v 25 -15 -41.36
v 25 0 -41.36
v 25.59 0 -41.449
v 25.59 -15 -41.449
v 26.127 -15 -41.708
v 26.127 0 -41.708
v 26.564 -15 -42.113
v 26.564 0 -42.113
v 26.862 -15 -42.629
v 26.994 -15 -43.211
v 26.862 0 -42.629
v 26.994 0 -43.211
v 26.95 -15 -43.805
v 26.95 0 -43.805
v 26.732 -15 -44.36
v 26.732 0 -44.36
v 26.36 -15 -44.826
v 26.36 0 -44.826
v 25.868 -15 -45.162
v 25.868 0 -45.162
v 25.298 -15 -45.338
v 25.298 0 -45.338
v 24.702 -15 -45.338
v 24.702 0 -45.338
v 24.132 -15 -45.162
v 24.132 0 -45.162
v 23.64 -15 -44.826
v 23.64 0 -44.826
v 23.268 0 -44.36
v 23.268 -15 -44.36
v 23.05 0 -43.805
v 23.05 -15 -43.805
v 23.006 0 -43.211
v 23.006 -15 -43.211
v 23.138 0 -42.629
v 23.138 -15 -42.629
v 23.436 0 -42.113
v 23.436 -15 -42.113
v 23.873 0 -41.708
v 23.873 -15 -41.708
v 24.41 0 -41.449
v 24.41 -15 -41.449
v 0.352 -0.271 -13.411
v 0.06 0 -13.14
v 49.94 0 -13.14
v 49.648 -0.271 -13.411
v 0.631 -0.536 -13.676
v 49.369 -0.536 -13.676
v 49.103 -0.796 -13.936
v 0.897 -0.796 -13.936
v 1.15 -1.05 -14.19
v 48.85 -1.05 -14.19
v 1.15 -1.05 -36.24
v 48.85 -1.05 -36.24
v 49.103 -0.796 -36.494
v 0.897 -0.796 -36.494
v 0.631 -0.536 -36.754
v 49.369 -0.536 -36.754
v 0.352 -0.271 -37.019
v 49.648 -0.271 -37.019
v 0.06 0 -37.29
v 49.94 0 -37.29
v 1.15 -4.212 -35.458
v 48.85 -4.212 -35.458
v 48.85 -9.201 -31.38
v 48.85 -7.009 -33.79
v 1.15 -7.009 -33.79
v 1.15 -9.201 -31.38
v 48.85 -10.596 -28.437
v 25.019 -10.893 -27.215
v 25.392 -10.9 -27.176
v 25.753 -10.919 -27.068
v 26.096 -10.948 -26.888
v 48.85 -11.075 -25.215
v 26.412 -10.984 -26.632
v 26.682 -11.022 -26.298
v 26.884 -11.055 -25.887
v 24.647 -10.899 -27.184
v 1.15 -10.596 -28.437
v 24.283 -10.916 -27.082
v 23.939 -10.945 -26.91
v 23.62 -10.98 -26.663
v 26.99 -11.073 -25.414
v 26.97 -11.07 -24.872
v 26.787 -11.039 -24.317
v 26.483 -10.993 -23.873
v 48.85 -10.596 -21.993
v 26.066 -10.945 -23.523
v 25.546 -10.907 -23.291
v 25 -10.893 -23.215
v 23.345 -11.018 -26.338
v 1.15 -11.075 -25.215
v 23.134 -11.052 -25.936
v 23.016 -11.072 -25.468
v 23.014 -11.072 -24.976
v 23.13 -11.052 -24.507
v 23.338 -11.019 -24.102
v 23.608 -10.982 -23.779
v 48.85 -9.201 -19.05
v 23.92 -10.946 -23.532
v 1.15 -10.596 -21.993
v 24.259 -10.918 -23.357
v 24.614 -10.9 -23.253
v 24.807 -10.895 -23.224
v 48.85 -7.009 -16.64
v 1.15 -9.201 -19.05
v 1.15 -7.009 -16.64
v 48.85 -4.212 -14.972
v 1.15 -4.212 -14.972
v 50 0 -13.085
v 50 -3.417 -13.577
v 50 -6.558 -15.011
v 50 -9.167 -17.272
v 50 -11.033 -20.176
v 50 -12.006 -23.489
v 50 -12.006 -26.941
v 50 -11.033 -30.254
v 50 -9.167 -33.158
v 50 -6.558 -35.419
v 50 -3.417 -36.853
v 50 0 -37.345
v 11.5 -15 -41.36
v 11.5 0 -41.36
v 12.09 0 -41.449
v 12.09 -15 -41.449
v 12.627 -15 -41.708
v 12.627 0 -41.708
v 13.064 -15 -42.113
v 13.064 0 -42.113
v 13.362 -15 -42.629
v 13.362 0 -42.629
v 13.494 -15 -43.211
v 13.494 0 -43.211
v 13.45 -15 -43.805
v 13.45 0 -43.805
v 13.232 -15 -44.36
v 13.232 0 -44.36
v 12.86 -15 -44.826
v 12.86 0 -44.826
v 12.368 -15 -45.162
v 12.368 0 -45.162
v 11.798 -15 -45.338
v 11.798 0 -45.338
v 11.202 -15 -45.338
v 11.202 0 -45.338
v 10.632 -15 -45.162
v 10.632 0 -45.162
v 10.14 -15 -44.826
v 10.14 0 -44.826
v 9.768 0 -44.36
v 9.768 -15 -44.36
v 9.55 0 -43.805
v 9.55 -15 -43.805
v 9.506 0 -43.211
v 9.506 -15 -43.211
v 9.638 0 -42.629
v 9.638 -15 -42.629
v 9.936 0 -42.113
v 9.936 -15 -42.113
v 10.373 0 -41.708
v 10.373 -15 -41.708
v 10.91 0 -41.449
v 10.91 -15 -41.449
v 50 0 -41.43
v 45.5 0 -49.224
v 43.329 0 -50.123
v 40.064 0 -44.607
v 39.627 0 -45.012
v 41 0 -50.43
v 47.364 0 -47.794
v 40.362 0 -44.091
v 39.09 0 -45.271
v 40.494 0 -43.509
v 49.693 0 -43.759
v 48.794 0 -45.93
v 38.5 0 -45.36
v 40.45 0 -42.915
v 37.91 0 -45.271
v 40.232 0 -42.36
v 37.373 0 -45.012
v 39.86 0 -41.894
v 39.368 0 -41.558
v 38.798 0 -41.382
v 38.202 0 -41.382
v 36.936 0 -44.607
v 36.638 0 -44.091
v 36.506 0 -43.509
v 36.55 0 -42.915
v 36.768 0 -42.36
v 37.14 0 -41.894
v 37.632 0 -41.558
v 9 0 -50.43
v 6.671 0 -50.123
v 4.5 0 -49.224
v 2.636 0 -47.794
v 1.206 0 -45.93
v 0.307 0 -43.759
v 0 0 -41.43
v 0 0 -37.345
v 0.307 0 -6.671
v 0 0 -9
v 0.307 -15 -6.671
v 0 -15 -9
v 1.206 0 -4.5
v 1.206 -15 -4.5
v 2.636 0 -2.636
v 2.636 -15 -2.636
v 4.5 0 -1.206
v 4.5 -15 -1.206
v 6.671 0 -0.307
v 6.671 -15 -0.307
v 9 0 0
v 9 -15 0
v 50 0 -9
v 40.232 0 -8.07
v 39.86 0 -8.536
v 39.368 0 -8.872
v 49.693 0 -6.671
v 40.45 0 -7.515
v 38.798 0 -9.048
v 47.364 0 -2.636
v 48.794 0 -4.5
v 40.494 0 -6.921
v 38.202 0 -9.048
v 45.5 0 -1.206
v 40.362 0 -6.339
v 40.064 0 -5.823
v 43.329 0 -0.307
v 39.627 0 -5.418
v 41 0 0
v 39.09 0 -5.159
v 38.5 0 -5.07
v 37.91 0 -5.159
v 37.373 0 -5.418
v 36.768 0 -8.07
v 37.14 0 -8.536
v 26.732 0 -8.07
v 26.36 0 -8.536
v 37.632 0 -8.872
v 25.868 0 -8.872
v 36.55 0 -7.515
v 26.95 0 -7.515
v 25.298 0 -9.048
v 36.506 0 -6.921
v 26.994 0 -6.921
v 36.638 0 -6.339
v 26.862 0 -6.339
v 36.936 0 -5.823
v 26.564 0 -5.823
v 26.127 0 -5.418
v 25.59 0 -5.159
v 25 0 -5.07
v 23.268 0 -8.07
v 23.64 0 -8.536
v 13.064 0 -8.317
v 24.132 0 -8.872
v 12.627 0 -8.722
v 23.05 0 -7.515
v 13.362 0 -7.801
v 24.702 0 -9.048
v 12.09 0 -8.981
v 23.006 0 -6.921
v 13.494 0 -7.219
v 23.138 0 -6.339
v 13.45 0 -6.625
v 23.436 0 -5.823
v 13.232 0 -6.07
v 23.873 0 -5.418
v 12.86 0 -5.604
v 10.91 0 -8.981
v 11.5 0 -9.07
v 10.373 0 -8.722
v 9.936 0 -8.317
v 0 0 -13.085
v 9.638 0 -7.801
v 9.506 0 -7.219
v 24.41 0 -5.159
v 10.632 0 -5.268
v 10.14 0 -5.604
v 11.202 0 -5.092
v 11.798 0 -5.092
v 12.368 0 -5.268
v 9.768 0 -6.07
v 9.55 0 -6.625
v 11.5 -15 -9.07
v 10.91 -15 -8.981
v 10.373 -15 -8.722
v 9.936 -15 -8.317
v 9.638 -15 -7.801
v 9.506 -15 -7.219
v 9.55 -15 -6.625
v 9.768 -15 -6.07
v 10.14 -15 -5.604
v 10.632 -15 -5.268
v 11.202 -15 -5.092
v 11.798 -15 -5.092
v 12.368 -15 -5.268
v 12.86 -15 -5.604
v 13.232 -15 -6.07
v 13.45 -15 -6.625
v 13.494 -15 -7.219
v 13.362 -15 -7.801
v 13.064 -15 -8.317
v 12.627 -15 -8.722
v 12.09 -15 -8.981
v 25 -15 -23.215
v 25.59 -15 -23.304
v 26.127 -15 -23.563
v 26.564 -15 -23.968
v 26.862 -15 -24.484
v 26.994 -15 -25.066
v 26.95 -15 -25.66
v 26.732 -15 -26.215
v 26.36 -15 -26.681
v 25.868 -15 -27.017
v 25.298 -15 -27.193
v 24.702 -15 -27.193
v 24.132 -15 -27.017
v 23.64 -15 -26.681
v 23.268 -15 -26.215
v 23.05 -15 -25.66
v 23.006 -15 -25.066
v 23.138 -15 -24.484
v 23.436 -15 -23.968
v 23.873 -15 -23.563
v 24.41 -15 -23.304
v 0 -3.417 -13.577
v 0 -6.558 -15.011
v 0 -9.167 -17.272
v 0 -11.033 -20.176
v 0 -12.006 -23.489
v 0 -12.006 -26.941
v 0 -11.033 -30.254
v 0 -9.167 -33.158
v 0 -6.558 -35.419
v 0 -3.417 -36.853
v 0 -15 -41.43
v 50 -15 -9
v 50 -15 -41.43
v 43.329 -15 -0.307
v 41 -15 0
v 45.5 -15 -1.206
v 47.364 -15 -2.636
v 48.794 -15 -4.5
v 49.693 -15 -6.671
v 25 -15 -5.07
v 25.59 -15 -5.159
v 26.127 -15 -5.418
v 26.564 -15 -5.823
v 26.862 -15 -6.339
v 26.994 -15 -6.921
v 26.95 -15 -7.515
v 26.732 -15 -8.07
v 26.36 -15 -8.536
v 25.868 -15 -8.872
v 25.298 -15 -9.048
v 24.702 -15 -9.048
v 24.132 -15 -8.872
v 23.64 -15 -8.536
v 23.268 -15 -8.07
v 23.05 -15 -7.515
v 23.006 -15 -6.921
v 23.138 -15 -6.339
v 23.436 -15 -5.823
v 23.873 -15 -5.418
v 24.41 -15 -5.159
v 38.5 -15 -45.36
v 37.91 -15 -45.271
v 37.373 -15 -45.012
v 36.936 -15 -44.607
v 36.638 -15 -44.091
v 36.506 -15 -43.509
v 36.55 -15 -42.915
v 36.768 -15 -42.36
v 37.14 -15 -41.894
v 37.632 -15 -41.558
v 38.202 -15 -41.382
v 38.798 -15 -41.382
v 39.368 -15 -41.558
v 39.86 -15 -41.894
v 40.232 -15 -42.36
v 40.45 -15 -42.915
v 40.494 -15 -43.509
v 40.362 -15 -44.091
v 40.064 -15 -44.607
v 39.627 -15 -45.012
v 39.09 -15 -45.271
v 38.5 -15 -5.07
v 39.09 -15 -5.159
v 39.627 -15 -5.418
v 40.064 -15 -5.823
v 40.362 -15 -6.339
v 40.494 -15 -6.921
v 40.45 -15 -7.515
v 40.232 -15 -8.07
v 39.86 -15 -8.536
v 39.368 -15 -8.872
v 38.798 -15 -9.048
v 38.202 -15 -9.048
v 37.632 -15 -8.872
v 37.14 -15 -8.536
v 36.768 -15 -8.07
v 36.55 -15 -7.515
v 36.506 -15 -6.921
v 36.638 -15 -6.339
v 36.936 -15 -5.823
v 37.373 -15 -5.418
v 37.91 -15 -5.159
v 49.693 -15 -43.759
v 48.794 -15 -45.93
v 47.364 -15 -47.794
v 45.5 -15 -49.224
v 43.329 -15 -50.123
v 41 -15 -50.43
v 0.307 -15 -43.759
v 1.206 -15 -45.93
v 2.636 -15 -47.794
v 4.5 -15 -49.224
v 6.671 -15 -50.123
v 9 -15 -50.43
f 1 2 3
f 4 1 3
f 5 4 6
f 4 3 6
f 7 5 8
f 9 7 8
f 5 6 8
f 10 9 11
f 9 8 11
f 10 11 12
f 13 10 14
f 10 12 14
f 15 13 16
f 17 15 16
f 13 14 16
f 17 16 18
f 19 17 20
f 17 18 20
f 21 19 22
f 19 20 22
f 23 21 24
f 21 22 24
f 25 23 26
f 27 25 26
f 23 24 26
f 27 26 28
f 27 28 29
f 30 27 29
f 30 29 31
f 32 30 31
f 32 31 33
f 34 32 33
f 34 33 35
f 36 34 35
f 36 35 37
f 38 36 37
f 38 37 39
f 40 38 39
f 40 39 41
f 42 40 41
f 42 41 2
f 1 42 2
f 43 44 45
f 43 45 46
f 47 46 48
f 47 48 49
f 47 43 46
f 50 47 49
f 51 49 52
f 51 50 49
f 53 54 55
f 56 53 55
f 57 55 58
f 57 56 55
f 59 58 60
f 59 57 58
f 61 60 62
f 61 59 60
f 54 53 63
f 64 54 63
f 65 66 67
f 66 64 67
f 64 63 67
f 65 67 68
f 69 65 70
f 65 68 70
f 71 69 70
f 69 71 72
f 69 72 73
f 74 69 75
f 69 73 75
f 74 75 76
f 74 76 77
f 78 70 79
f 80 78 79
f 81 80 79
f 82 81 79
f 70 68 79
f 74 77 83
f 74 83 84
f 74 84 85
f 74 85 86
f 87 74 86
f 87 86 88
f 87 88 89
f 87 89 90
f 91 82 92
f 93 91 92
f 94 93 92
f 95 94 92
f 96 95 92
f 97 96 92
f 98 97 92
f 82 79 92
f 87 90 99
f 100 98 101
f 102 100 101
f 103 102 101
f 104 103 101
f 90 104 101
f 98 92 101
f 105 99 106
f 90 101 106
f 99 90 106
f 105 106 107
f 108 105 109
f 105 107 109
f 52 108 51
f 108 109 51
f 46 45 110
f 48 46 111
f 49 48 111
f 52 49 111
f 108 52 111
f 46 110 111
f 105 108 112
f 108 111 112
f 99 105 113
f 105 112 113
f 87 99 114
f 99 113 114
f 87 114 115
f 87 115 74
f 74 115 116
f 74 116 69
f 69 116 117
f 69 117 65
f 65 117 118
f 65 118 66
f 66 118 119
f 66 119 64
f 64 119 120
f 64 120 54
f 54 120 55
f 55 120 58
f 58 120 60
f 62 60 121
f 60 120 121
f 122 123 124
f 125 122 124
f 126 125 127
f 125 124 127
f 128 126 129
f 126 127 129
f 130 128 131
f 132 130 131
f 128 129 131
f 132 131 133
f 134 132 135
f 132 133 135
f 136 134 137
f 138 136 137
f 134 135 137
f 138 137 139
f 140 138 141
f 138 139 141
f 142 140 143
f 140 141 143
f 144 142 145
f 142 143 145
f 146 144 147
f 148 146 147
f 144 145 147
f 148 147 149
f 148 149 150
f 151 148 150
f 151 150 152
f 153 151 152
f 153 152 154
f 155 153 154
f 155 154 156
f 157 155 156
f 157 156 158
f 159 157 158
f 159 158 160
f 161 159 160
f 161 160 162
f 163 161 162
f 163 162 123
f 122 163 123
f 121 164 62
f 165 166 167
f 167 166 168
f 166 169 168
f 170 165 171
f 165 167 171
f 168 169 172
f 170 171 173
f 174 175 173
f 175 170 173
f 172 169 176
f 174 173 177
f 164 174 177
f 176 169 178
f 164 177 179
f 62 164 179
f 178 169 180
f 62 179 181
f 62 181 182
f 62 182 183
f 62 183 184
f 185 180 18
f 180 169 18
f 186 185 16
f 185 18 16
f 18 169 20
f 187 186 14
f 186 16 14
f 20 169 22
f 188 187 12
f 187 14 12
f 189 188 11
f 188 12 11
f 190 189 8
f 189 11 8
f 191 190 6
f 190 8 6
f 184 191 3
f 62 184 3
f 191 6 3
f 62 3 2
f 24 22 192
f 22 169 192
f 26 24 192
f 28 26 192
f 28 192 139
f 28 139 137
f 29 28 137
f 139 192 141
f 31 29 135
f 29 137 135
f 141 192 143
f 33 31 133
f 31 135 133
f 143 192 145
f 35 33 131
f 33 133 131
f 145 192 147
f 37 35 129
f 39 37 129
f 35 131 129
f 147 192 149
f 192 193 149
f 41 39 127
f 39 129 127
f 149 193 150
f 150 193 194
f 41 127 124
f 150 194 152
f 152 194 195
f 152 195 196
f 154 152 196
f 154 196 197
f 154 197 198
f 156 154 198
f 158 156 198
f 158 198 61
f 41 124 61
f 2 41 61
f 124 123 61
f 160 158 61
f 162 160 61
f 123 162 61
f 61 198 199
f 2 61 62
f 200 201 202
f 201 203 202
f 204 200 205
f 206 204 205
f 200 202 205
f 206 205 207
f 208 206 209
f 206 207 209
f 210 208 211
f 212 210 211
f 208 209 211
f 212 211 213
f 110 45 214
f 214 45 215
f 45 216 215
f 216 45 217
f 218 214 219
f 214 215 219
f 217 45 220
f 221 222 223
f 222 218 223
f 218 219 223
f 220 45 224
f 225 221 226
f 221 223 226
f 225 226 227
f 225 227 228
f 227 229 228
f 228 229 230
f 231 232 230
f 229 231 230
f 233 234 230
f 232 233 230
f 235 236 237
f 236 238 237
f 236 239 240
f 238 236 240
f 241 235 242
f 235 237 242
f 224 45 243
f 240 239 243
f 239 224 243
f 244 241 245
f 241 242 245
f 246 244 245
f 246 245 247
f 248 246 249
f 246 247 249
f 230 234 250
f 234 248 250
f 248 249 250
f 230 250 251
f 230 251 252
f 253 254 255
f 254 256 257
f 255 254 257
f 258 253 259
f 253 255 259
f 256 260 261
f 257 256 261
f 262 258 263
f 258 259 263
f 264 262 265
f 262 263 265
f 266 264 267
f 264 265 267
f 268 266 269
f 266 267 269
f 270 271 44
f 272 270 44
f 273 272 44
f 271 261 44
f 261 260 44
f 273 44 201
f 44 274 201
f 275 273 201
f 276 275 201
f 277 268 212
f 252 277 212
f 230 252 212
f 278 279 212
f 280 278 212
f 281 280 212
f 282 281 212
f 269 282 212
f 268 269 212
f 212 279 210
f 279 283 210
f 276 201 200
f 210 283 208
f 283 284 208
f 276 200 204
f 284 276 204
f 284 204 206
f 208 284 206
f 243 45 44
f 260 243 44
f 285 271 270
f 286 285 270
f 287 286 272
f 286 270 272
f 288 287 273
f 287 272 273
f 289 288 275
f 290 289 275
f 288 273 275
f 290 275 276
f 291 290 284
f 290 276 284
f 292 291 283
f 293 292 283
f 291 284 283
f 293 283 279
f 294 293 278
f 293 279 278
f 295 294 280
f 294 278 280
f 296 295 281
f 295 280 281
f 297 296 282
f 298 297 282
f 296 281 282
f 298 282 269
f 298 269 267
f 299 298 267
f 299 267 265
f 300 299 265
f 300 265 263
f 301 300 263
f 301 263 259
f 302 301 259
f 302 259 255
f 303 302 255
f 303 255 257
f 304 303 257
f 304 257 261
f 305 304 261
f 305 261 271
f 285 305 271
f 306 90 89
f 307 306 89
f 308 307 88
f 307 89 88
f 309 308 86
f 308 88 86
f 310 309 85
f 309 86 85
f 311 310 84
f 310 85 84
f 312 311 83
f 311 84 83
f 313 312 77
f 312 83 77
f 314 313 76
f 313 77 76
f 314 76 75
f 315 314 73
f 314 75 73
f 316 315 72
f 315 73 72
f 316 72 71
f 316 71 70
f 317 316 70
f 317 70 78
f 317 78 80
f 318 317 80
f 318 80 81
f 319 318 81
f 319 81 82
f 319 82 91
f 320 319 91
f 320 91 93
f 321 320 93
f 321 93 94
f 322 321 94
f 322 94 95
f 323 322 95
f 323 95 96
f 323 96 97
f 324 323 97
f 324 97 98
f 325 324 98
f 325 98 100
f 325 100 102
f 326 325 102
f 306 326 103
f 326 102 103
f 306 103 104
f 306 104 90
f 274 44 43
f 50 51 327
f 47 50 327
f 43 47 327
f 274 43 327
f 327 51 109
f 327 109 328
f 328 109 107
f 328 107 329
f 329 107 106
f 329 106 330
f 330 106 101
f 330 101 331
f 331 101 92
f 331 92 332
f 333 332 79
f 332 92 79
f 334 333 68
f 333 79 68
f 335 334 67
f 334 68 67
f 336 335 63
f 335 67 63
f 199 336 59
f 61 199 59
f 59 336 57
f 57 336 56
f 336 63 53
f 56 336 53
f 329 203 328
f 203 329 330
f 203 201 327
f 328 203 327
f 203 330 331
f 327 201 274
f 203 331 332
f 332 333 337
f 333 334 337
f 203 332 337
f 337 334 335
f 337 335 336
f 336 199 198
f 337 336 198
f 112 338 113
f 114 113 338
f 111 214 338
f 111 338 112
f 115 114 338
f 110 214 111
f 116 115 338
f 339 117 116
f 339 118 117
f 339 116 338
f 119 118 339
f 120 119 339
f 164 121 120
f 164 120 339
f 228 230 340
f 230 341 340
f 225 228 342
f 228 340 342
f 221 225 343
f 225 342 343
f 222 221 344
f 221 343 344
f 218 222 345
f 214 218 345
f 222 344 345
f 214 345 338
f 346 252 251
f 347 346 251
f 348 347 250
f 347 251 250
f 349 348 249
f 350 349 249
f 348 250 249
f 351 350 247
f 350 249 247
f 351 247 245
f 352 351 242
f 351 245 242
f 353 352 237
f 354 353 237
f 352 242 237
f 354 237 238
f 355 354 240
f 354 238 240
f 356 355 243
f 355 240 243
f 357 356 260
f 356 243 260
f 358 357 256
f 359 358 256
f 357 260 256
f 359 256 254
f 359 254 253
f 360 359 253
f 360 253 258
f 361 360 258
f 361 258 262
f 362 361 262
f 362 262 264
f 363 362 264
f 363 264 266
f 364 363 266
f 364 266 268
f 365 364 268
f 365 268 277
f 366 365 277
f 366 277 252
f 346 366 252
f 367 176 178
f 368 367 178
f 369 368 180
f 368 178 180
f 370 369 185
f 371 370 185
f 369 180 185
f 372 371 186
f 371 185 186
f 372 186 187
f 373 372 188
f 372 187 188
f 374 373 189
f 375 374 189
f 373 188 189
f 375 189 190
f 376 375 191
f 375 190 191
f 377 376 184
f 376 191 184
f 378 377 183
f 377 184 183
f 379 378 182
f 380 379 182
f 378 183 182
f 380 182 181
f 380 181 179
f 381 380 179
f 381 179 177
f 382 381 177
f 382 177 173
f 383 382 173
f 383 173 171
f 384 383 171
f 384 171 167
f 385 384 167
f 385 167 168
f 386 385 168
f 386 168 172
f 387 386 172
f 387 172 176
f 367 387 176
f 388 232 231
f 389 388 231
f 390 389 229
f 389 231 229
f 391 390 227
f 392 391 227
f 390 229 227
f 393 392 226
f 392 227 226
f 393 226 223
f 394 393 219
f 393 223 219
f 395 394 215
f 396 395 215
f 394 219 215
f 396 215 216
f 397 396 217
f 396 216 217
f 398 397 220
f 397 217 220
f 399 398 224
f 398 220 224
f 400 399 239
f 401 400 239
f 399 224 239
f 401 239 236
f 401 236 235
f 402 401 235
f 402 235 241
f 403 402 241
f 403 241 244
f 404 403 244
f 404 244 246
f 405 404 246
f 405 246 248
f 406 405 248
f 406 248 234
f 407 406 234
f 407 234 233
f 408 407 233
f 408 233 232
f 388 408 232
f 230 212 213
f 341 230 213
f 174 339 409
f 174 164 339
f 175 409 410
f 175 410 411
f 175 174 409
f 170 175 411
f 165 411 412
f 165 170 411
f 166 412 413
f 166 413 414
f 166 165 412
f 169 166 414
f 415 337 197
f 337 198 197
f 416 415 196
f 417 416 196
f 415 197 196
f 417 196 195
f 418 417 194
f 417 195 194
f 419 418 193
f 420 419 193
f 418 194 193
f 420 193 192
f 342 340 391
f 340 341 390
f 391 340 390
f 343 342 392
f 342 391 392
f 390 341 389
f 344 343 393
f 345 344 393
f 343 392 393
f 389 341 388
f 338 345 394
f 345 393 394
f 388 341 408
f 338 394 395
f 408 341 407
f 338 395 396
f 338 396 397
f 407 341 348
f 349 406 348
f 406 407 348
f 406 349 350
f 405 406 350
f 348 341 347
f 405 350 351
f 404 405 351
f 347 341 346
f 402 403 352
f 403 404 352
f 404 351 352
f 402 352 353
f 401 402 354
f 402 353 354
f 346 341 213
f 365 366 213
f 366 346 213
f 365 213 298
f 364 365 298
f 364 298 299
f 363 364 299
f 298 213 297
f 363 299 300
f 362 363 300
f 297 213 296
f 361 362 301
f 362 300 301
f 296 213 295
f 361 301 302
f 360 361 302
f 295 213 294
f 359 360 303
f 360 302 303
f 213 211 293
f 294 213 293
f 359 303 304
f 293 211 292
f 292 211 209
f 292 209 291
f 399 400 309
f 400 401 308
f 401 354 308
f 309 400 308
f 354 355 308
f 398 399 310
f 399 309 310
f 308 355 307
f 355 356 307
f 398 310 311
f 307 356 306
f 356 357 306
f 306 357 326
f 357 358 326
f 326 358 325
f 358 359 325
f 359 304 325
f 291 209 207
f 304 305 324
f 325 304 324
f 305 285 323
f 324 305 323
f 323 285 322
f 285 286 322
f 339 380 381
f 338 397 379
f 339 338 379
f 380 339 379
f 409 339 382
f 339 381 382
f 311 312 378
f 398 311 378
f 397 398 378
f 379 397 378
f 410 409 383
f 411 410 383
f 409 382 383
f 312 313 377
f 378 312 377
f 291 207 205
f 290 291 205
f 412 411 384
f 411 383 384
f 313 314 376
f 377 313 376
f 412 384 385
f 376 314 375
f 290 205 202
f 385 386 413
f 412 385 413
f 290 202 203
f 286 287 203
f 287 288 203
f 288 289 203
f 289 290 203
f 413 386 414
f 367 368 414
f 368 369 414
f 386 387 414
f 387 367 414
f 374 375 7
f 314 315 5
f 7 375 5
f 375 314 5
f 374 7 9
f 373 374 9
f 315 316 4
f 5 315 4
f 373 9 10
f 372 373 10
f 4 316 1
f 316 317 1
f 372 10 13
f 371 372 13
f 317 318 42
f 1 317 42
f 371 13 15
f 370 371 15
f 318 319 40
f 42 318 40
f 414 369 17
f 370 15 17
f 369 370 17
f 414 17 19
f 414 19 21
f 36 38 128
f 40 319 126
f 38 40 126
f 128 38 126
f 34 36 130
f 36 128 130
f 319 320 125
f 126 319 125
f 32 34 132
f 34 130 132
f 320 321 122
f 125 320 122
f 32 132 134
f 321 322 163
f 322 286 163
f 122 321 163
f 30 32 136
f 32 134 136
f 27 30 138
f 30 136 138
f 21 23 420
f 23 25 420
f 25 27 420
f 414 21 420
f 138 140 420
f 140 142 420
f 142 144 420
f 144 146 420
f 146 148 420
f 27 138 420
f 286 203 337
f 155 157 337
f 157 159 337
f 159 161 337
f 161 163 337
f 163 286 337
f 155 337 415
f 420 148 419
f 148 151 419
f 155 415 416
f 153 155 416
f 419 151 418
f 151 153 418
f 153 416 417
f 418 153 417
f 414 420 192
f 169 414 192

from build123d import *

# Parameters (mm, degrees)
BOSS_EXTRUDE1_DEPTH = 50
SKETCH2_R           = 2
CUT_EXTRUDE1_DEPTH  = 73.582262985
CHAMFER2_START      = -1
CHAMFER2_2_DEPTH    = 52
FILLET3_R           = 9


with BuildPart() as part:
    # Sketch1 → Boss-Extrude1 (new body)
    with BuildSketch(Plane(origin=(0, 0, 0), x_dir=(0, 0, -1), z_dir=(1, 0, 0))):
        with BuildLine():
            Line((14.14, 0), (0, 0))
            Line((0, 0), (0, -15))
            Line((0, -15), (50.43, -15))
            Line((50.43, -15), (50.43, 0))
            Line((50.43, 0), (36.29, 0))
            ThreePointArc((36.29, 0), (25.215, -11.075), (14.14, 0))
        make_face()
    extrude(amount=BOSS_EXTRUDE1_DEPTH)

    # Sketch2 → Cut-Extrude1 (cut, through all)
    with BuildSketch(Plane(origin=(0, 0, 0), x_dir=(1, 0, 0), z_dir=(0, 1, 0))):
        with Locations(Location((11.5, 43.36, 0), (0, 0, 270))):
            Circle(SKETCH2_R)
        with Locations(Location((38.5, 43.36, 0), (0, 0, 90))):
            Circle(SKETCH2_R)
        with Locations(Location((38.5, 7.07, 0), (0, 0, 270))):
            Circle(SKETCH2_R)
        with Locations(Location((11.5, 7.07, 0), (0, 0, 90))):
            Circle(SKETCH2_R)
        with Locations(Location((25, 25.215, 0), (0, 0, 270))):
            Circle(SKETCH2_R)
        with Locations(Location((25, 43.36, 0), (0, 0, 270))):
            Circle(SKETCH2_R)
        with Locations(Location((25, 7.07, 0), (0, 0, 270))):
            Circle(SKETCH2_R)
    extrude(amount=-CUT_EXTRUDE1_DEPTH, mode=Mode.SUBTRACT)

    # Chamfer2: read off the stored shape, not the designer's step
    # Chamfer2 outline → Chamfer2 (revolve, cut)
    with BuildSketch(Plane.YX.offset(25.215)):
        Polygon((12.129624038, 0), (11.075, 1.149849684), (11.075, 0), align=None)
        Polygon((11.075, 50), (11.075, 48.850150316), (12.129624038, 50), align=None)
    revolve(axis=Axis((0, 0, -25.215), (1, 0, 0)), mode=Mode.SUBTRACT)

    # Chamfer2 2 outline → Chamfer2 2 (cut)
    with BuildSketch(Plane.YZ.offset(CHAMFER2_START)):
        with BuildLine():
            Line((0, -14.14), (0, -13.14))
            Line((0, -13.14), (-1.049874688, -14.189874688))
            ThreePointArc((-1.049874688, -14.189874688), (-0.525529339, -14.152475699), (0, -14.14))
        make_face()
        with BuildLine():
            ThreePointArc((0, -36.29), (-0.525529339, -36.277524301), (-1.049874688, -36.240125312))
            Line((-1.049874688, -36.240125312), (0, -37.29))
            Line((0, -37.29), (0, -36.29))
        make_face()
    extrude(amount=CHAMFER2_2_DEPTH, mode=Mode.SUBTRACT)

    # Fillet3
    fillet3_edges = [part.edges().sort_by_distance(p)[0] for p in [
        (50, -7.5, 0),
        (50, -7.5, -50.43),
        (0, -7.5, -50.43),
        (0, -7.5, 0),
    ]]
    fillet(fillet3_edges, radius=FILLET3_R)


solid = part.part
